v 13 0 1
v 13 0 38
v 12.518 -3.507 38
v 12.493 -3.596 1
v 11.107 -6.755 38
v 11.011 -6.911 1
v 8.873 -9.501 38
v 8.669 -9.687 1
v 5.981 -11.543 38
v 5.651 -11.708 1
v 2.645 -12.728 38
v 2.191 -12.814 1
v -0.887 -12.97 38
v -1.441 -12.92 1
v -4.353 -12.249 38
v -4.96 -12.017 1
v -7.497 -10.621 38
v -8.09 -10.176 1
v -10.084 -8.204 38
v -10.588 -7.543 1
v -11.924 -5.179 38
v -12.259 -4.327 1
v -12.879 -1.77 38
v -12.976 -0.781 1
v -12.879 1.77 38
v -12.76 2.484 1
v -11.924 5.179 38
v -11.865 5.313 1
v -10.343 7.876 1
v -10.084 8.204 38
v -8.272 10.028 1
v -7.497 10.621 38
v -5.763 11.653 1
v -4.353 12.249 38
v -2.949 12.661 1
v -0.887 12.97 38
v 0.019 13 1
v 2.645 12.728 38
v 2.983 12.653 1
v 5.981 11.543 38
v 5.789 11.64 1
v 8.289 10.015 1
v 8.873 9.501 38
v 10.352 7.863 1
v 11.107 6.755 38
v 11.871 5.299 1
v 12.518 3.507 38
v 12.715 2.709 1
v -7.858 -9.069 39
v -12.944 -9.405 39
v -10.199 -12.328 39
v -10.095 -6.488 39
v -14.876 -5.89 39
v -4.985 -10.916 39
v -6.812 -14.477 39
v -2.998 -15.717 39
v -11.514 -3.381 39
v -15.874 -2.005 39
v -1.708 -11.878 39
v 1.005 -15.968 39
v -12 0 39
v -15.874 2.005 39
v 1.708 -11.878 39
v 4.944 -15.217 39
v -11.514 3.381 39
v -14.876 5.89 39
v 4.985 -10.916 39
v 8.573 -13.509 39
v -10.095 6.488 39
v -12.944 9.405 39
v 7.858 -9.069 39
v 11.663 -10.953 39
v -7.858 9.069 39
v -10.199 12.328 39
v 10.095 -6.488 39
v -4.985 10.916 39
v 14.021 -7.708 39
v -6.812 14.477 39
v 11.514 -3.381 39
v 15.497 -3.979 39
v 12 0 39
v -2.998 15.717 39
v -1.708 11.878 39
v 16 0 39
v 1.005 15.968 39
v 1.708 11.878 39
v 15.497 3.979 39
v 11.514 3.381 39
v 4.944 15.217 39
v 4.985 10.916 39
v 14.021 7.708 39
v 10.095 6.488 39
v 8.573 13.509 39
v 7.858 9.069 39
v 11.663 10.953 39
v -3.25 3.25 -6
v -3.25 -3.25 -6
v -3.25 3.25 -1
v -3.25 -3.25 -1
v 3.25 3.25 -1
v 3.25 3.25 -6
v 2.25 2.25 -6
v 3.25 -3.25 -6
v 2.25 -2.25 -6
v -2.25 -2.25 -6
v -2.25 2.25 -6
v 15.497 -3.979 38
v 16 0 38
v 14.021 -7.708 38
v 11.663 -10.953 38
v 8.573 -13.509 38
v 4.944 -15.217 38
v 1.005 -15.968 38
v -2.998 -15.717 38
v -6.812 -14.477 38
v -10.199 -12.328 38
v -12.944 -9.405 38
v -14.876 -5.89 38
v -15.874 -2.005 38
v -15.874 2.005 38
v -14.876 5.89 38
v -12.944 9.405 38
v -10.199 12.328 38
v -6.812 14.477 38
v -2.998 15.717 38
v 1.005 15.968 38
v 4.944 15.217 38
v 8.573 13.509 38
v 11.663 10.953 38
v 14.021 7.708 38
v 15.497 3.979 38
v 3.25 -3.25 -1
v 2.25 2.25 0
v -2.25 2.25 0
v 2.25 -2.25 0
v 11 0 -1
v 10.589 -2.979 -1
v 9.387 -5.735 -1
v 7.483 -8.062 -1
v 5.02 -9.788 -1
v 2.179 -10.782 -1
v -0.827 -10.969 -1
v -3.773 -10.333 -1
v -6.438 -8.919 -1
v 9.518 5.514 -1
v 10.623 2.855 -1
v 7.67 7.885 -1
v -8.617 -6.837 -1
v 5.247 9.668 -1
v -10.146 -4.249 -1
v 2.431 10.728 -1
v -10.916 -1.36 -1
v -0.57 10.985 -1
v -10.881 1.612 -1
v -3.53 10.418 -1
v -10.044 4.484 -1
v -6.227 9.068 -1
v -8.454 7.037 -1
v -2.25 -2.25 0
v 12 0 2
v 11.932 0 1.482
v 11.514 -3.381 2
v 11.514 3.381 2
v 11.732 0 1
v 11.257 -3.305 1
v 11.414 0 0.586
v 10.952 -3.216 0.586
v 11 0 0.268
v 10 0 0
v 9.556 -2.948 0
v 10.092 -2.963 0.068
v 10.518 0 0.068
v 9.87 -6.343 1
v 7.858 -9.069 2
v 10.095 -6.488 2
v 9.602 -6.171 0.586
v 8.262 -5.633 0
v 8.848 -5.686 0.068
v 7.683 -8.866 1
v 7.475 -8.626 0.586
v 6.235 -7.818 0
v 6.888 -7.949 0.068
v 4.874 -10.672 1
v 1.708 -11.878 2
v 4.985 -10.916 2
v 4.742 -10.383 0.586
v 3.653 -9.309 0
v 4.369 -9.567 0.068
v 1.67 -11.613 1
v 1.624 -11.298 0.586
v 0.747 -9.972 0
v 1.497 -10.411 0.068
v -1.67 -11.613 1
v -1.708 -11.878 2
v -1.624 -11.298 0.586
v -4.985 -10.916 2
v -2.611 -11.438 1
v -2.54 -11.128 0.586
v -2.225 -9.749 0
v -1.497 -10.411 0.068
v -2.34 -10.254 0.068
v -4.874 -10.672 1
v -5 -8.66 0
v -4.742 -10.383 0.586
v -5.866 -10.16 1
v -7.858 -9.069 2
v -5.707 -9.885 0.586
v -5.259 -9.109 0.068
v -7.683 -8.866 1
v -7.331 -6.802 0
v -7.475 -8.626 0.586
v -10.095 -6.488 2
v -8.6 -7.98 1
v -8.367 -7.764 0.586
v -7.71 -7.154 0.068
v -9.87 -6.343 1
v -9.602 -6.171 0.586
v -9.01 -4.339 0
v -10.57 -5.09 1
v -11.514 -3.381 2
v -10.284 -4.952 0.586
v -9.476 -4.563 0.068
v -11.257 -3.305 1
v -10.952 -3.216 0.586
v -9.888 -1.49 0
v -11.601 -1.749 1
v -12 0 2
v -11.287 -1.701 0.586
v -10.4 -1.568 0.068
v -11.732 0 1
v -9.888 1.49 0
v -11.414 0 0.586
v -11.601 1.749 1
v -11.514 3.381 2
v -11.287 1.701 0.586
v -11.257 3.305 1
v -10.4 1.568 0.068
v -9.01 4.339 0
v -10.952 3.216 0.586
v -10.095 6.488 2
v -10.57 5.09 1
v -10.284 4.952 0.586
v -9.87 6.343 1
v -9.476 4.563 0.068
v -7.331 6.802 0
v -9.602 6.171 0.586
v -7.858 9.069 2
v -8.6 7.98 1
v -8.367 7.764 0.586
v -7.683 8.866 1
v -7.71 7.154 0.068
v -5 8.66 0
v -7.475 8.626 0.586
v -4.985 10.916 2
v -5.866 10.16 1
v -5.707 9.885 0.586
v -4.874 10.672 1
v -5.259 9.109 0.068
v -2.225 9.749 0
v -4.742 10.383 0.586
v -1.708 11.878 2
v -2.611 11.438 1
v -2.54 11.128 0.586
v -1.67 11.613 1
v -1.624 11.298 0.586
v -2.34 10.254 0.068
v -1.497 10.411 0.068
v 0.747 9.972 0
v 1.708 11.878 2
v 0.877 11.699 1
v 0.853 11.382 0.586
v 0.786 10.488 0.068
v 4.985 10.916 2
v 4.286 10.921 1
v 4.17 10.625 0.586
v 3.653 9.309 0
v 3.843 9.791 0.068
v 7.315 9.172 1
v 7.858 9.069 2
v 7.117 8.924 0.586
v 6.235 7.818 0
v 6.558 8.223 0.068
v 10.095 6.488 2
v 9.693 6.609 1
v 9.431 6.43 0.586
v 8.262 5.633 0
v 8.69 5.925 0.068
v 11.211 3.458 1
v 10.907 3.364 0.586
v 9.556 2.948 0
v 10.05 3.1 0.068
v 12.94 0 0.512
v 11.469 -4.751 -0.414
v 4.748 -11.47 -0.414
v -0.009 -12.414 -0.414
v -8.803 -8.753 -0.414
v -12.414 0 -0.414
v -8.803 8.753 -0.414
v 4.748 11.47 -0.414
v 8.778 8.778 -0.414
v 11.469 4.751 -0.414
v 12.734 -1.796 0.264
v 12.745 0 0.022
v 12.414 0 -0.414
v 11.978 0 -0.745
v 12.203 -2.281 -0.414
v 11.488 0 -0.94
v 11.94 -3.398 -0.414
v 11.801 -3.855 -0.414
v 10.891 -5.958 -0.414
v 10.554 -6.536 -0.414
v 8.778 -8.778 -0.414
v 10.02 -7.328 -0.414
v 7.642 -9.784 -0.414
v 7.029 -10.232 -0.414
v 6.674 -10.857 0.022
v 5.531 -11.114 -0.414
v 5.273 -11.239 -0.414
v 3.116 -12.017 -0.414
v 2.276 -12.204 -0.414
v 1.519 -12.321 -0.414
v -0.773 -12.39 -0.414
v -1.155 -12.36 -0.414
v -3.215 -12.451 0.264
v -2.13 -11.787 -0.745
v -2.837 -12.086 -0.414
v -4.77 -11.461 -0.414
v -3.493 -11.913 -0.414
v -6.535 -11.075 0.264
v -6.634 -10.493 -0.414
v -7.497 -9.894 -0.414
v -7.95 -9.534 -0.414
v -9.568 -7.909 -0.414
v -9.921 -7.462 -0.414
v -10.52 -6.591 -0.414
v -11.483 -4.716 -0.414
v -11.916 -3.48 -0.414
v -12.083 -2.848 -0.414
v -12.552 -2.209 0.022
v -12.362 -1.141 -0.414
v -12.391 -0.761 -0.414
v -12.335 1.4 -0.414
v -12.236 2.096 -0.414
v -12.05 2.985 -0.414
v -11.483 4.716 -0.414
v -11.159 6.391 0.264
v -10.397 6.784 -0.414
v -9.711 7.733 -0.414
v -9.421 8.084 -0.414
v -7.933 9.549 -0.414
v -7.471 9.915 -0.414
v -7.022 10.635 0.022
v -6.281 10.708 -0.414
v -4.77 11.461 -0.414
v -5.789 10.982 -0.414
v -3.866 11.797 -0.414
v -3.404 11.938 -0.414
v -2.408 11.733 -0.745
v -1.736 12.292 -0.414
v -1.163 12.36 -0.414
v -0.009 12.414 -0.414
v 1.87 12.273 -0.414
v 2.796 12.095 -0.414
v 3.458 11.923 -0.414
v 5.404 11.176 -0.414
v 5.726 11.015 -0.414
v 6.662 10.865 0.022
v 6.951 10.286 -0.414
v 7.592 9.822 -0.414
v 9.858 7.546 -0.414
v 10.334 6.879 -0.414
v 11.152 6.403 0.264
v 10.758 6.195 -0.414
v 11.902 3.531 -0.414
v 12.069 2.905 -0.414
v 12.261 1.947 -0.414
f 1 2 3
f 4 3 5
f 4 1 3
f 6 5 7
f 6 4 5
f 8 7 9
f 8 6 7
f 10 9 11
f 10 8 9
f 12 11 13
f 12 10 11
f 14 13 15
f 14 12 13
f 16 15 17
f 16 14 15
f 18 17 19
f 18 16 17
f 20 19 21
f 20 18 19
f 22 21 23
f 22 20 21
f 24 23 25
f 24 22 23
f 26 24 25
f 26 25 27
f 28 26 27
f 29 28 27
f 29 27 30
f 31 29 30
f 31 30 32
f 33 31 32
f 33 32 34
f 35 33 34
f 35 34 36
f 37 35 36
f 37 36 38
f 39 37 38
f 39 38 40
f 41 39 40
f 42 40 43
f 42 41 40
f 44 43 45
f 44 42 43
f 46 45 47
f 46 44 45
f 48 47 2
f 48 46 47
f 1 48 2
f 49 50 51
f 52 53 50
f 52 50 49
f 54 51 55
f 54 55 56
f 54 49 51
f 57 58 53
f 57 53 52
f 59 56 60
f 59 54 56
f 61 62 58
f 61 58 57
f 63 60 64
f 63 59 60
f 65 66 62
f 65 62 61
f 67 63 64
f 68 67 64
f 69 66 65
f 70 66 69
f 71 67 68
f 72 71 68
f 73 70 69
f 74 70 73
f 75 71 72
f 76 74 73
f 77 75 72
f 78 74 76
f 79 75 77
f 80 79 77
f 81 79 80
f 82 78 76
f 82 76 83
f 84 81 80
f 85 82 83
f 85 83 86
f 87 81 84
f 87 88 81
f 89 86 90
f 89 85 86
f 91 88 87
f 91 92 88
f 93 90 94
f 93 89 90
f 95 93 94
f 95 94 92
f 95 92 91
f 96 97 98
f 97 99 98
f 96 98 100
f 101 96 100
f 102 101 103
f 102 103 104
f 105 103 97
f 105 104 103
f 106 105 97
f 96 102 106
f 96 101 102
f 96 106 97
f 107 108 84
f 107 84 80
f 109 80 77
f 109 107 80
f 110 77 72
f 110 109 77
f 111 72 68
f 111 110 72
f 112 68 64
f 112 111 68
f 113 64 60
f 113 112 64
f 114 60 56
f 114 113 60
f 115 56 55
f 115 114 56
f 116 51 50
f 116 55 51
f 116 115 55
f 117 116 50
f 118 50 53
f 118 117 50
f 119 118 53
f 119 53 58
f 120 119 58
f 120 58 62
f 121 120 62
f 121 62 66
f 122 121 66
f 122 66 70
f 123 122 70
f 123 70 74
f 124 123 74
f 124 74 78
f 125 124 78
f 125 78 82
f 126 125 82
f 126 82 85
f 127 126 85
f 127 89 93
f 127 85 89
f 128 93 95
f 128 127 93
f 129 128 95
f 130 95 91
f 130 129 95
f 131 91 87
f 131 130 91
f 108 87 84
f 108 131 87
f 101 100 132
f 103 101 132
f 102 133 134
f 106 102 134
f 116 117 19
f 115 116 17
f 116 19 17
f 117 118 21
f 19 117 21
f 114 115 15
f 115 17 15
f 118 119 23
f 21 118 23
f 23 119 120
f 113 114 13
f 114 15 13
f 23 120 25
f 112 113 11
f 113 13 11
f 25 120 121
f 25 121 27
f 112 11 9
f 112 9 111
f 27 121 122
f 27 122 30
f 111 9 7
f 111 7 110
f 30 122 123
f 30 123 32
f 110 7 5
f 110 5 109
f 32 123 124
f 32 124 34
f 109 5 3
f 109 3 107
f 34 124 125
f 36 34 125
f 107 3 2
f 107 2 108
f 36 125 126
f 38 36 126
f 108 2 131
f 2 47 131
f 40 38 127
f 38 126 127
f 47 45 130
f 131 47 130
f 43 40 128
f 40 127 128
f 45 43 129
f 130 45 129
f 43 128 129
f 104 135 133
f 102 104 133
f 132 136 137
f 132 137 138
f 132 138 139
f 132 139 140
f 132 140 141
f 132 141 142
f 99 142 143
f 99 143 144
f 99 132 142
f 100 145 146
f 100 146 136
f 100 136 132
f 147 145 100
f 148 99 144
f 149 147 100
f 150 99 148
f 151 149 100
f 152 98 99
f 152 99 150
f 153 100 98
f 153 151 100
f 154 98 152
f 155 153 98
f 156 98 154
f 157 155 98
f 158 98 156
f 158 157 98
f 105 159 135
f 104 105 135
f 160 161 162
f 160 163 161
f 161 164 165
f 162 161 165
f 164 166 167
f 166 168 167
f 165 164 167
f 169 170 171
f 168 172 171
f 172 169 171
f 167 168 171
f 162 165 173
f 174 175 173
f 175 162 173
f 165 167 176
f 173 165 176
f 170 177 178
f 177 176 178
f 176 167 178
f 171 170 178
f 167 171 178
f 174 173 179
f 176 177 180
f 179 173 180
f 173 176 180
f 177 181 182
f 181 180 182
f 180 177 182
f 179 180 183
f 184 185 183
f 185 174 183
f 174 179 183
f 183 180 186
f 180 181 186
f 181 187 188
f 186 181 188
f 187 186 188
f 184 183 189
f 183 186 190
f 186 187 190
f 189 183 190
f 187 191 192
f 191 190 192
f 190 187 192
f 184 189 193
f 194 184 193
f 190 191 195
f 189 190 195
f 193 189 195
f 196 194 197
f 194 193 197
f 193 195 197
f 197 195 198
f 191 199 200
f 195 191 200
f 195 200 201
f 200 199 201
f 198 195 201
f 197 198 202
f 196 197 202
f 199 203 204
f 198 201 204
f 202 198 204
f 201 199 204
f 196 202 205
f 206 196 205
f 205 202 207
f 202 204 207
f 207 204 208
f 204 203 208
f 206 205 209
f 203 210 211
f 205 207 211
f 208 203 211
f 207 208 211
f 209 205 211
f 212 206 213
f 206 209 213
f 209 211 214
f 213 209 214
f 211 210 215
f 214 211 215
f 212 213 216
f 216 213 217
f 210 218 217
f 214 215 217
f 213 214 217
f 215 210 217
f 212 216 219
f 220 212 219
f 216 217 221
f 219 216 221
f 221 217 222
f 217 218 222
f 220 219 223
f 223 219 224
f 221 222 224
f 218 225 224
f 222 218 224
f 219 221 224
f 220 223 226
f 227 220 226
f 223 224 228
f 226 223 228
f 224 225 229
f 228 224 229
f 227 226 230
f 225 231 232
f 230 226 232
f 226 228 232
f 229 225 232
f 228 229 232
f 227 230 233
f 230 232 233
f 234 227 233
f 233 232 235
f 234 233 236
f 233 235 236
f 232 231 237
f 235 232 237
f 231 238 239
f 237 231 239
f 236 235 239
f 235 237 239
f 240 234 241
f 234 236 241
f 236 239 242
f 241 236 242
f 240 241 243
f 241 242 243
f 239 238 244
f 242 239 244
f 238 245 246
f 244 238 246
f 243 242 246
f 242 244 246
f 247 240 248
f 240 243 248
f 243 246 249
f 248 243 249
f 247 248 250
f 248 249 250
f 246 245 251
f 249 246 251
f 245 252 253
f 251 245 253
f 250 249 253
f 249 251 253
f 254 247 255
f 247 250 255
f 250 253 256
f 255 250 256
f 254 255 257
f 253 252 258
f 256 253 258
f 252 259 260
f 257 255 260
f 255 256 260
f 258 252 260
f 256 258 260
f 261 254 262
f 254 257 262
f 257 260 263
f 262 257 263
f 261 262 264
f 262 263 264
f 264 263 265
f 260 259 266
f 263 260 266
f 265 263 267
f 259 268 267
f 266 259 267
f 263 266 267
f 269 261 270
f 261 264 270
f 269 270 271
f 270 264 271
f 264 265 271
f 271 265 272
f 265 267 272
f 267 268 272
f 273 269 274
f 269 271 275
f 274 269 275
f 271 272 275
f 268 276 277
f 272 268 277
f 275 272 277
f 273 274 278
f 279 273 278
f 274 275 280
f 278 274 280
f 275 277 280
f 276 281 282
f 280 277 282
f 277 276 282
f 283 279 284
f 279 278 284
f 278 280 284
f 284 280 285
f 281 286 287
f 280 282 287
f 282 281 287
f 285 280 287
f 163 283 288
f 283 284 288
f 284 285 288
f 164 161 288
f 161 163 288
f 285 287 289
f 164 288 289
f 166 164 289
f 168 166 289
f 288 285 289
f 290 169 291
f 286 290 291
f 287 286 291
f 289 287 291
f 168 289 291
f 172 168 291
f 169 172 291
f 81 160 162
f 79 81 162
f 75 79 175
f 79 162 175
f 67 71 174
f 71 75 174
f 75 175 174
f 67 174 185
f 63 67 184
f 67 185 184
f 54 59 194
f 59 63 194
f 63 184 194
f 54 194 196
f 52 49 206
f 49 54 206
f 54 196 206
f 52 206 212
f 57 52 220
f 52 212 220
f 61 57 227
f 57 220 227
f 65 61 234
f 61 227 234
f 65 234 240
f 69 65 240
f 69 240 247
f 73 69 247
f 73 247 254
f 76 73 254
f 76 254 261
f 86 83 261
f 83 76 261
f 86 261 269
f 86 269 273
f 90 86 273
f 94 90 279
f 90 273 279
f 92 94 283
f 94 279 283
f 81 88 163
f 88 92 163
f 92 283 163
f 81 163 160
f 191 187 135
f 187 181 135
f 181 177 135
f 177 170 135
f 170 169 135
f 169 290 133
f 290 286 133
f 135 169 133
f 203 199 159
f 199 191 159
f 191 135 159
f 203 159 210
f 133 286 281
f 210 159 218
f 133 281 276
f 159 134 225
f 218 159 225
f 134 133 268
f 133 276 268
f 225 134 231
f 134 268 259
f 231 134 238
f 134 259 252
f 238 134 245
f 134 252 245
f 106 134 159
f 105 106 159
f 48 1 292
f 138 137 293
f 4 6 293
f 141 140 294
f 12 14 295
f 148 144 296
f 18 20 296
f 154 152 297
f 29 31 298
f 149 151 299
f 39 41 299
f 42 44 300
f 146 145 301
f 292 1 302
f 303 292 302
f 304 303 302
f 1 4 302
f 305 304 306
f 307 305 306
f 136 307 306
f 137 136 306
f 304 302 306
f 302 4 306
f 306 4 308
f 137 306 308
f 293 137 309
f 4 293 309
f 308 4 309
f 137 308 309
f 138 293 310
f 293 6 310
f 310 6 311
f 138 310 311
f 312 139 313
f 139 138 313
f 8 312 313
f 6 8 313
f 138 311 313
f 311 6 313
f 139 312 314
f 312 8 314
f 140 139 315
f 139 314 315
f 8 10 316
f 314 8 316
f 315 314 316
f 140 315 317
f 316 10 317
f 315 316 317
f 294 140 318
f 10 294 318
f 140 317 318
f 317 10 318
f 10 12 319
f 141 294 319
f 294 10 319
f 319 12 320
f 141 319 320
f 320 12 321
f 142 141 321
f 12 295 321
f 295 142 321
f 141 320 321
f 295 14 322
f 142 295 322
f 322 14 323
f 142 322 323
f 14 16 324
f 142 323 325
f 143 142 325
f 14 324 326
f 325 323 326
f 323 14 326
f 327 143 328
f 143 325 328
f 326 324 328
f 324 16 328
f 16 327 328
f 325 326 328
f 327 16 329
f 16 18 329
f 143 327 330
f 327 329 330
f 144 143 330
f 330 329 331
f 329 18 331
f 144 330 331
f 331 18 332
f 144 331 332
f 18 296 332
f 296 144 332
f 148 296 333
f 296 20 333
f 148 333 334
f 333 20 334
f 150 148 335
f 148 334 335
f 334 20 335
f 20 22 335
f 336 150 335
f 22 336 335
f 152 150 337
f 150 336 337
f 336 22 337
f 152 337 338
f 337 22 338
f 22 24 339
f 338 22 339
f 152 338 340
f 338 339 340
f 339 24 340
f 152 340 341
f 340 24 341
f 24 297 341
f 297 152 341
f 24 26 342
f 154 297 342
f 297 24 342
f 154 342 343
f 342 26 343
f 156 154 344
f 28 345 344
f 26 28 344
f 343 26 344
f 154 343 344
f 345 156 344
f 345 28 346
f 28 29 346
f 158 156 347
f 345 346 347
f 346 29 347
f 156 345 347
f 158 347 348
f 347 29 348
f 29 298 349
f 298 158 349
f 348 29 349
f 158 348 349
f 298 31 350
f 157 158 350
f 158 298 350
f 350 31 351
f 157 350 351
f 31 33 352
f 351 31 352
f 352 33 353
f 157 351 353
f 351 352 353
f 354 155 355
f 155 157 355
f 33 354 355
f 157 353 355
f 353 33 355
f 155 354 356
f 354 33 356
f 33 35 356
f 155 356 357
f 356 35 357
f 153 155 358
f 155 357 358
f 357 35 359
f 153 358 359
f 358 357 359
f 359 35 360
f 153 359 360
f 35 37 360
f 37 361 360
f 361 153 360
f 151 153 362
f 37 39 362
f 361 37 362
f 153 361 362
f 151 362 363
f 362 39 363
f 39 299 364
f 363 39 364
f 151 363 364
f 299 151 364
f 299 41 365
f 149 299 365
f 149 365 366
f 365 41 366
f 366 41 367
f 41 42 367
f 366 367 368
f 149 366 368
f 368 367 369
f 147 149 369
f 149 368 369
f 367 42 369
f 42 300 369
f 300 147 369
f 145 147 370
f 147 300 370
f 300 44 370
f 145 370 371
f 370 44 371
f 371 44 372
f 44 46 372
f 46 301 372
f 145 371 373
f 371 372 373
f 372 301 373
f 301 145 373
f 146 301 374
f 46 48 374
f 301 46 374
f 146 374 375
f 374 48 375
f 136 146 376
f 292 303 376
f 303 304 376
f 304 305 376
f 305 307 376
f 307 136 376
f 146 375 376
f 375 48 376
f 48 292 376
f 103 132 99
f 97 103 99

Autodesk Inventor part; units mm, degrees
ref_plane "YZ Plane" through (0, 0, 0) normal (1, 0, 0) x (0, 1, 0)
ref_plane "XZ Plane" through (0, 0, 0) normal (0, 1, 0) x (-1, 0, 0)
ref_plane "XY Plane" through (0, 0, 0) normal (0, 0, 1) x (1, 0, 0)
sketch "Эскиз1" plane through (0, 0, 0) normal (0, 0, 1) x (1, 0, 0)
  circle A0 centre (0, 0) radius 13
  circle A1 centre (0, 0) radius 12
  dimension "d0" = 26
  dimension "d1" = 24
extrude "Выдавливание1" add sketch "Эскиз1" along normal blind 38
sketch "Эскиз2" plane through (0, 0, 38) normal (0, 0, 1) x (1, 0, 0)
  circle A0 centre (0, 0) radius 16
  circle A1 centre (0, 0) radius 12
  dimension "d4" = 32
  dimension "d5" = 24
extrude "Выдавливание2" add sketch "Эскиз2" along normal blind 1
sketch "Эскиз3" plane through (0, 0, 0) normal (0, 0, -1) x (-1, 0, 0)
  circle A0 centre (0, 0) radius 13 projected
extrude "Выдавливание3" add sketch "Эскиз3" along normal blind 1
fillet "Сопряжение1" radius 2 1 edges at (-12, 0, 0)
fillet "Сопряжение2" radius 2 1 edges at (13, 0, -1)
sketch "Эскиз4" plane through (0, 0, -1) normal (0, 0, -1) x (-1, 0, 0)
  line L0 (-2.25, -2.25) -> (2.25, -2.25)
  line L1 (2.25, -2.25) -> (2.25, 2.25)
  line L2 (2.25, 2.25) -> (-2.25, 2.25)
  line L3 (-2.25, 2.25) -> (-2.25, -2.25)
  line L4 (22.4, 0) -> (-22.4, 0) projected
  line L5 (0, -22.4) -> (0, 22.4) projected
  point P0 (0, 0)
  dimension "d12" = 4.5
  dimension "d13" = 4.5
extrude "Выдавливание4" cut sketch "Эскиз4" against normal blind 1
sketch "Эскиз5" plane through (0, 0, -1) normal (0, 0, -1) x (-1, 0, 0)
  line L0 (-2.25, 2.25) -> (2.25, 2.25) projected
  line L1 (-2.25, -2.25) -> (-2.25, 2.25) projected
  line L2 (2.25, -2.25) -> (-2.25, -2.25) projected
  line L3 (2.25, 2.25) -> (2.25, -2.25) projected
  line L4 (-3.25, -3.25) -> (3.25, -3.25)
  line L5 (3.25, -3.25) -> (3.25, 3.25)
  line L6 (3.25, 3.25) -> (-3.25, 3.25)
  line L7 (-3.25, 3.25) -> (-3.25, -3.25)
  point P0 (0, 0)
  dimension "d16" = 1
  dimension "d17" = 1
  dimension "d18" = 1
  dimension "d19" = 1
extrude "Выдавливание5" add sketch "Эскиз5" along normal blind 5
properties part number "насадка для катпака"
